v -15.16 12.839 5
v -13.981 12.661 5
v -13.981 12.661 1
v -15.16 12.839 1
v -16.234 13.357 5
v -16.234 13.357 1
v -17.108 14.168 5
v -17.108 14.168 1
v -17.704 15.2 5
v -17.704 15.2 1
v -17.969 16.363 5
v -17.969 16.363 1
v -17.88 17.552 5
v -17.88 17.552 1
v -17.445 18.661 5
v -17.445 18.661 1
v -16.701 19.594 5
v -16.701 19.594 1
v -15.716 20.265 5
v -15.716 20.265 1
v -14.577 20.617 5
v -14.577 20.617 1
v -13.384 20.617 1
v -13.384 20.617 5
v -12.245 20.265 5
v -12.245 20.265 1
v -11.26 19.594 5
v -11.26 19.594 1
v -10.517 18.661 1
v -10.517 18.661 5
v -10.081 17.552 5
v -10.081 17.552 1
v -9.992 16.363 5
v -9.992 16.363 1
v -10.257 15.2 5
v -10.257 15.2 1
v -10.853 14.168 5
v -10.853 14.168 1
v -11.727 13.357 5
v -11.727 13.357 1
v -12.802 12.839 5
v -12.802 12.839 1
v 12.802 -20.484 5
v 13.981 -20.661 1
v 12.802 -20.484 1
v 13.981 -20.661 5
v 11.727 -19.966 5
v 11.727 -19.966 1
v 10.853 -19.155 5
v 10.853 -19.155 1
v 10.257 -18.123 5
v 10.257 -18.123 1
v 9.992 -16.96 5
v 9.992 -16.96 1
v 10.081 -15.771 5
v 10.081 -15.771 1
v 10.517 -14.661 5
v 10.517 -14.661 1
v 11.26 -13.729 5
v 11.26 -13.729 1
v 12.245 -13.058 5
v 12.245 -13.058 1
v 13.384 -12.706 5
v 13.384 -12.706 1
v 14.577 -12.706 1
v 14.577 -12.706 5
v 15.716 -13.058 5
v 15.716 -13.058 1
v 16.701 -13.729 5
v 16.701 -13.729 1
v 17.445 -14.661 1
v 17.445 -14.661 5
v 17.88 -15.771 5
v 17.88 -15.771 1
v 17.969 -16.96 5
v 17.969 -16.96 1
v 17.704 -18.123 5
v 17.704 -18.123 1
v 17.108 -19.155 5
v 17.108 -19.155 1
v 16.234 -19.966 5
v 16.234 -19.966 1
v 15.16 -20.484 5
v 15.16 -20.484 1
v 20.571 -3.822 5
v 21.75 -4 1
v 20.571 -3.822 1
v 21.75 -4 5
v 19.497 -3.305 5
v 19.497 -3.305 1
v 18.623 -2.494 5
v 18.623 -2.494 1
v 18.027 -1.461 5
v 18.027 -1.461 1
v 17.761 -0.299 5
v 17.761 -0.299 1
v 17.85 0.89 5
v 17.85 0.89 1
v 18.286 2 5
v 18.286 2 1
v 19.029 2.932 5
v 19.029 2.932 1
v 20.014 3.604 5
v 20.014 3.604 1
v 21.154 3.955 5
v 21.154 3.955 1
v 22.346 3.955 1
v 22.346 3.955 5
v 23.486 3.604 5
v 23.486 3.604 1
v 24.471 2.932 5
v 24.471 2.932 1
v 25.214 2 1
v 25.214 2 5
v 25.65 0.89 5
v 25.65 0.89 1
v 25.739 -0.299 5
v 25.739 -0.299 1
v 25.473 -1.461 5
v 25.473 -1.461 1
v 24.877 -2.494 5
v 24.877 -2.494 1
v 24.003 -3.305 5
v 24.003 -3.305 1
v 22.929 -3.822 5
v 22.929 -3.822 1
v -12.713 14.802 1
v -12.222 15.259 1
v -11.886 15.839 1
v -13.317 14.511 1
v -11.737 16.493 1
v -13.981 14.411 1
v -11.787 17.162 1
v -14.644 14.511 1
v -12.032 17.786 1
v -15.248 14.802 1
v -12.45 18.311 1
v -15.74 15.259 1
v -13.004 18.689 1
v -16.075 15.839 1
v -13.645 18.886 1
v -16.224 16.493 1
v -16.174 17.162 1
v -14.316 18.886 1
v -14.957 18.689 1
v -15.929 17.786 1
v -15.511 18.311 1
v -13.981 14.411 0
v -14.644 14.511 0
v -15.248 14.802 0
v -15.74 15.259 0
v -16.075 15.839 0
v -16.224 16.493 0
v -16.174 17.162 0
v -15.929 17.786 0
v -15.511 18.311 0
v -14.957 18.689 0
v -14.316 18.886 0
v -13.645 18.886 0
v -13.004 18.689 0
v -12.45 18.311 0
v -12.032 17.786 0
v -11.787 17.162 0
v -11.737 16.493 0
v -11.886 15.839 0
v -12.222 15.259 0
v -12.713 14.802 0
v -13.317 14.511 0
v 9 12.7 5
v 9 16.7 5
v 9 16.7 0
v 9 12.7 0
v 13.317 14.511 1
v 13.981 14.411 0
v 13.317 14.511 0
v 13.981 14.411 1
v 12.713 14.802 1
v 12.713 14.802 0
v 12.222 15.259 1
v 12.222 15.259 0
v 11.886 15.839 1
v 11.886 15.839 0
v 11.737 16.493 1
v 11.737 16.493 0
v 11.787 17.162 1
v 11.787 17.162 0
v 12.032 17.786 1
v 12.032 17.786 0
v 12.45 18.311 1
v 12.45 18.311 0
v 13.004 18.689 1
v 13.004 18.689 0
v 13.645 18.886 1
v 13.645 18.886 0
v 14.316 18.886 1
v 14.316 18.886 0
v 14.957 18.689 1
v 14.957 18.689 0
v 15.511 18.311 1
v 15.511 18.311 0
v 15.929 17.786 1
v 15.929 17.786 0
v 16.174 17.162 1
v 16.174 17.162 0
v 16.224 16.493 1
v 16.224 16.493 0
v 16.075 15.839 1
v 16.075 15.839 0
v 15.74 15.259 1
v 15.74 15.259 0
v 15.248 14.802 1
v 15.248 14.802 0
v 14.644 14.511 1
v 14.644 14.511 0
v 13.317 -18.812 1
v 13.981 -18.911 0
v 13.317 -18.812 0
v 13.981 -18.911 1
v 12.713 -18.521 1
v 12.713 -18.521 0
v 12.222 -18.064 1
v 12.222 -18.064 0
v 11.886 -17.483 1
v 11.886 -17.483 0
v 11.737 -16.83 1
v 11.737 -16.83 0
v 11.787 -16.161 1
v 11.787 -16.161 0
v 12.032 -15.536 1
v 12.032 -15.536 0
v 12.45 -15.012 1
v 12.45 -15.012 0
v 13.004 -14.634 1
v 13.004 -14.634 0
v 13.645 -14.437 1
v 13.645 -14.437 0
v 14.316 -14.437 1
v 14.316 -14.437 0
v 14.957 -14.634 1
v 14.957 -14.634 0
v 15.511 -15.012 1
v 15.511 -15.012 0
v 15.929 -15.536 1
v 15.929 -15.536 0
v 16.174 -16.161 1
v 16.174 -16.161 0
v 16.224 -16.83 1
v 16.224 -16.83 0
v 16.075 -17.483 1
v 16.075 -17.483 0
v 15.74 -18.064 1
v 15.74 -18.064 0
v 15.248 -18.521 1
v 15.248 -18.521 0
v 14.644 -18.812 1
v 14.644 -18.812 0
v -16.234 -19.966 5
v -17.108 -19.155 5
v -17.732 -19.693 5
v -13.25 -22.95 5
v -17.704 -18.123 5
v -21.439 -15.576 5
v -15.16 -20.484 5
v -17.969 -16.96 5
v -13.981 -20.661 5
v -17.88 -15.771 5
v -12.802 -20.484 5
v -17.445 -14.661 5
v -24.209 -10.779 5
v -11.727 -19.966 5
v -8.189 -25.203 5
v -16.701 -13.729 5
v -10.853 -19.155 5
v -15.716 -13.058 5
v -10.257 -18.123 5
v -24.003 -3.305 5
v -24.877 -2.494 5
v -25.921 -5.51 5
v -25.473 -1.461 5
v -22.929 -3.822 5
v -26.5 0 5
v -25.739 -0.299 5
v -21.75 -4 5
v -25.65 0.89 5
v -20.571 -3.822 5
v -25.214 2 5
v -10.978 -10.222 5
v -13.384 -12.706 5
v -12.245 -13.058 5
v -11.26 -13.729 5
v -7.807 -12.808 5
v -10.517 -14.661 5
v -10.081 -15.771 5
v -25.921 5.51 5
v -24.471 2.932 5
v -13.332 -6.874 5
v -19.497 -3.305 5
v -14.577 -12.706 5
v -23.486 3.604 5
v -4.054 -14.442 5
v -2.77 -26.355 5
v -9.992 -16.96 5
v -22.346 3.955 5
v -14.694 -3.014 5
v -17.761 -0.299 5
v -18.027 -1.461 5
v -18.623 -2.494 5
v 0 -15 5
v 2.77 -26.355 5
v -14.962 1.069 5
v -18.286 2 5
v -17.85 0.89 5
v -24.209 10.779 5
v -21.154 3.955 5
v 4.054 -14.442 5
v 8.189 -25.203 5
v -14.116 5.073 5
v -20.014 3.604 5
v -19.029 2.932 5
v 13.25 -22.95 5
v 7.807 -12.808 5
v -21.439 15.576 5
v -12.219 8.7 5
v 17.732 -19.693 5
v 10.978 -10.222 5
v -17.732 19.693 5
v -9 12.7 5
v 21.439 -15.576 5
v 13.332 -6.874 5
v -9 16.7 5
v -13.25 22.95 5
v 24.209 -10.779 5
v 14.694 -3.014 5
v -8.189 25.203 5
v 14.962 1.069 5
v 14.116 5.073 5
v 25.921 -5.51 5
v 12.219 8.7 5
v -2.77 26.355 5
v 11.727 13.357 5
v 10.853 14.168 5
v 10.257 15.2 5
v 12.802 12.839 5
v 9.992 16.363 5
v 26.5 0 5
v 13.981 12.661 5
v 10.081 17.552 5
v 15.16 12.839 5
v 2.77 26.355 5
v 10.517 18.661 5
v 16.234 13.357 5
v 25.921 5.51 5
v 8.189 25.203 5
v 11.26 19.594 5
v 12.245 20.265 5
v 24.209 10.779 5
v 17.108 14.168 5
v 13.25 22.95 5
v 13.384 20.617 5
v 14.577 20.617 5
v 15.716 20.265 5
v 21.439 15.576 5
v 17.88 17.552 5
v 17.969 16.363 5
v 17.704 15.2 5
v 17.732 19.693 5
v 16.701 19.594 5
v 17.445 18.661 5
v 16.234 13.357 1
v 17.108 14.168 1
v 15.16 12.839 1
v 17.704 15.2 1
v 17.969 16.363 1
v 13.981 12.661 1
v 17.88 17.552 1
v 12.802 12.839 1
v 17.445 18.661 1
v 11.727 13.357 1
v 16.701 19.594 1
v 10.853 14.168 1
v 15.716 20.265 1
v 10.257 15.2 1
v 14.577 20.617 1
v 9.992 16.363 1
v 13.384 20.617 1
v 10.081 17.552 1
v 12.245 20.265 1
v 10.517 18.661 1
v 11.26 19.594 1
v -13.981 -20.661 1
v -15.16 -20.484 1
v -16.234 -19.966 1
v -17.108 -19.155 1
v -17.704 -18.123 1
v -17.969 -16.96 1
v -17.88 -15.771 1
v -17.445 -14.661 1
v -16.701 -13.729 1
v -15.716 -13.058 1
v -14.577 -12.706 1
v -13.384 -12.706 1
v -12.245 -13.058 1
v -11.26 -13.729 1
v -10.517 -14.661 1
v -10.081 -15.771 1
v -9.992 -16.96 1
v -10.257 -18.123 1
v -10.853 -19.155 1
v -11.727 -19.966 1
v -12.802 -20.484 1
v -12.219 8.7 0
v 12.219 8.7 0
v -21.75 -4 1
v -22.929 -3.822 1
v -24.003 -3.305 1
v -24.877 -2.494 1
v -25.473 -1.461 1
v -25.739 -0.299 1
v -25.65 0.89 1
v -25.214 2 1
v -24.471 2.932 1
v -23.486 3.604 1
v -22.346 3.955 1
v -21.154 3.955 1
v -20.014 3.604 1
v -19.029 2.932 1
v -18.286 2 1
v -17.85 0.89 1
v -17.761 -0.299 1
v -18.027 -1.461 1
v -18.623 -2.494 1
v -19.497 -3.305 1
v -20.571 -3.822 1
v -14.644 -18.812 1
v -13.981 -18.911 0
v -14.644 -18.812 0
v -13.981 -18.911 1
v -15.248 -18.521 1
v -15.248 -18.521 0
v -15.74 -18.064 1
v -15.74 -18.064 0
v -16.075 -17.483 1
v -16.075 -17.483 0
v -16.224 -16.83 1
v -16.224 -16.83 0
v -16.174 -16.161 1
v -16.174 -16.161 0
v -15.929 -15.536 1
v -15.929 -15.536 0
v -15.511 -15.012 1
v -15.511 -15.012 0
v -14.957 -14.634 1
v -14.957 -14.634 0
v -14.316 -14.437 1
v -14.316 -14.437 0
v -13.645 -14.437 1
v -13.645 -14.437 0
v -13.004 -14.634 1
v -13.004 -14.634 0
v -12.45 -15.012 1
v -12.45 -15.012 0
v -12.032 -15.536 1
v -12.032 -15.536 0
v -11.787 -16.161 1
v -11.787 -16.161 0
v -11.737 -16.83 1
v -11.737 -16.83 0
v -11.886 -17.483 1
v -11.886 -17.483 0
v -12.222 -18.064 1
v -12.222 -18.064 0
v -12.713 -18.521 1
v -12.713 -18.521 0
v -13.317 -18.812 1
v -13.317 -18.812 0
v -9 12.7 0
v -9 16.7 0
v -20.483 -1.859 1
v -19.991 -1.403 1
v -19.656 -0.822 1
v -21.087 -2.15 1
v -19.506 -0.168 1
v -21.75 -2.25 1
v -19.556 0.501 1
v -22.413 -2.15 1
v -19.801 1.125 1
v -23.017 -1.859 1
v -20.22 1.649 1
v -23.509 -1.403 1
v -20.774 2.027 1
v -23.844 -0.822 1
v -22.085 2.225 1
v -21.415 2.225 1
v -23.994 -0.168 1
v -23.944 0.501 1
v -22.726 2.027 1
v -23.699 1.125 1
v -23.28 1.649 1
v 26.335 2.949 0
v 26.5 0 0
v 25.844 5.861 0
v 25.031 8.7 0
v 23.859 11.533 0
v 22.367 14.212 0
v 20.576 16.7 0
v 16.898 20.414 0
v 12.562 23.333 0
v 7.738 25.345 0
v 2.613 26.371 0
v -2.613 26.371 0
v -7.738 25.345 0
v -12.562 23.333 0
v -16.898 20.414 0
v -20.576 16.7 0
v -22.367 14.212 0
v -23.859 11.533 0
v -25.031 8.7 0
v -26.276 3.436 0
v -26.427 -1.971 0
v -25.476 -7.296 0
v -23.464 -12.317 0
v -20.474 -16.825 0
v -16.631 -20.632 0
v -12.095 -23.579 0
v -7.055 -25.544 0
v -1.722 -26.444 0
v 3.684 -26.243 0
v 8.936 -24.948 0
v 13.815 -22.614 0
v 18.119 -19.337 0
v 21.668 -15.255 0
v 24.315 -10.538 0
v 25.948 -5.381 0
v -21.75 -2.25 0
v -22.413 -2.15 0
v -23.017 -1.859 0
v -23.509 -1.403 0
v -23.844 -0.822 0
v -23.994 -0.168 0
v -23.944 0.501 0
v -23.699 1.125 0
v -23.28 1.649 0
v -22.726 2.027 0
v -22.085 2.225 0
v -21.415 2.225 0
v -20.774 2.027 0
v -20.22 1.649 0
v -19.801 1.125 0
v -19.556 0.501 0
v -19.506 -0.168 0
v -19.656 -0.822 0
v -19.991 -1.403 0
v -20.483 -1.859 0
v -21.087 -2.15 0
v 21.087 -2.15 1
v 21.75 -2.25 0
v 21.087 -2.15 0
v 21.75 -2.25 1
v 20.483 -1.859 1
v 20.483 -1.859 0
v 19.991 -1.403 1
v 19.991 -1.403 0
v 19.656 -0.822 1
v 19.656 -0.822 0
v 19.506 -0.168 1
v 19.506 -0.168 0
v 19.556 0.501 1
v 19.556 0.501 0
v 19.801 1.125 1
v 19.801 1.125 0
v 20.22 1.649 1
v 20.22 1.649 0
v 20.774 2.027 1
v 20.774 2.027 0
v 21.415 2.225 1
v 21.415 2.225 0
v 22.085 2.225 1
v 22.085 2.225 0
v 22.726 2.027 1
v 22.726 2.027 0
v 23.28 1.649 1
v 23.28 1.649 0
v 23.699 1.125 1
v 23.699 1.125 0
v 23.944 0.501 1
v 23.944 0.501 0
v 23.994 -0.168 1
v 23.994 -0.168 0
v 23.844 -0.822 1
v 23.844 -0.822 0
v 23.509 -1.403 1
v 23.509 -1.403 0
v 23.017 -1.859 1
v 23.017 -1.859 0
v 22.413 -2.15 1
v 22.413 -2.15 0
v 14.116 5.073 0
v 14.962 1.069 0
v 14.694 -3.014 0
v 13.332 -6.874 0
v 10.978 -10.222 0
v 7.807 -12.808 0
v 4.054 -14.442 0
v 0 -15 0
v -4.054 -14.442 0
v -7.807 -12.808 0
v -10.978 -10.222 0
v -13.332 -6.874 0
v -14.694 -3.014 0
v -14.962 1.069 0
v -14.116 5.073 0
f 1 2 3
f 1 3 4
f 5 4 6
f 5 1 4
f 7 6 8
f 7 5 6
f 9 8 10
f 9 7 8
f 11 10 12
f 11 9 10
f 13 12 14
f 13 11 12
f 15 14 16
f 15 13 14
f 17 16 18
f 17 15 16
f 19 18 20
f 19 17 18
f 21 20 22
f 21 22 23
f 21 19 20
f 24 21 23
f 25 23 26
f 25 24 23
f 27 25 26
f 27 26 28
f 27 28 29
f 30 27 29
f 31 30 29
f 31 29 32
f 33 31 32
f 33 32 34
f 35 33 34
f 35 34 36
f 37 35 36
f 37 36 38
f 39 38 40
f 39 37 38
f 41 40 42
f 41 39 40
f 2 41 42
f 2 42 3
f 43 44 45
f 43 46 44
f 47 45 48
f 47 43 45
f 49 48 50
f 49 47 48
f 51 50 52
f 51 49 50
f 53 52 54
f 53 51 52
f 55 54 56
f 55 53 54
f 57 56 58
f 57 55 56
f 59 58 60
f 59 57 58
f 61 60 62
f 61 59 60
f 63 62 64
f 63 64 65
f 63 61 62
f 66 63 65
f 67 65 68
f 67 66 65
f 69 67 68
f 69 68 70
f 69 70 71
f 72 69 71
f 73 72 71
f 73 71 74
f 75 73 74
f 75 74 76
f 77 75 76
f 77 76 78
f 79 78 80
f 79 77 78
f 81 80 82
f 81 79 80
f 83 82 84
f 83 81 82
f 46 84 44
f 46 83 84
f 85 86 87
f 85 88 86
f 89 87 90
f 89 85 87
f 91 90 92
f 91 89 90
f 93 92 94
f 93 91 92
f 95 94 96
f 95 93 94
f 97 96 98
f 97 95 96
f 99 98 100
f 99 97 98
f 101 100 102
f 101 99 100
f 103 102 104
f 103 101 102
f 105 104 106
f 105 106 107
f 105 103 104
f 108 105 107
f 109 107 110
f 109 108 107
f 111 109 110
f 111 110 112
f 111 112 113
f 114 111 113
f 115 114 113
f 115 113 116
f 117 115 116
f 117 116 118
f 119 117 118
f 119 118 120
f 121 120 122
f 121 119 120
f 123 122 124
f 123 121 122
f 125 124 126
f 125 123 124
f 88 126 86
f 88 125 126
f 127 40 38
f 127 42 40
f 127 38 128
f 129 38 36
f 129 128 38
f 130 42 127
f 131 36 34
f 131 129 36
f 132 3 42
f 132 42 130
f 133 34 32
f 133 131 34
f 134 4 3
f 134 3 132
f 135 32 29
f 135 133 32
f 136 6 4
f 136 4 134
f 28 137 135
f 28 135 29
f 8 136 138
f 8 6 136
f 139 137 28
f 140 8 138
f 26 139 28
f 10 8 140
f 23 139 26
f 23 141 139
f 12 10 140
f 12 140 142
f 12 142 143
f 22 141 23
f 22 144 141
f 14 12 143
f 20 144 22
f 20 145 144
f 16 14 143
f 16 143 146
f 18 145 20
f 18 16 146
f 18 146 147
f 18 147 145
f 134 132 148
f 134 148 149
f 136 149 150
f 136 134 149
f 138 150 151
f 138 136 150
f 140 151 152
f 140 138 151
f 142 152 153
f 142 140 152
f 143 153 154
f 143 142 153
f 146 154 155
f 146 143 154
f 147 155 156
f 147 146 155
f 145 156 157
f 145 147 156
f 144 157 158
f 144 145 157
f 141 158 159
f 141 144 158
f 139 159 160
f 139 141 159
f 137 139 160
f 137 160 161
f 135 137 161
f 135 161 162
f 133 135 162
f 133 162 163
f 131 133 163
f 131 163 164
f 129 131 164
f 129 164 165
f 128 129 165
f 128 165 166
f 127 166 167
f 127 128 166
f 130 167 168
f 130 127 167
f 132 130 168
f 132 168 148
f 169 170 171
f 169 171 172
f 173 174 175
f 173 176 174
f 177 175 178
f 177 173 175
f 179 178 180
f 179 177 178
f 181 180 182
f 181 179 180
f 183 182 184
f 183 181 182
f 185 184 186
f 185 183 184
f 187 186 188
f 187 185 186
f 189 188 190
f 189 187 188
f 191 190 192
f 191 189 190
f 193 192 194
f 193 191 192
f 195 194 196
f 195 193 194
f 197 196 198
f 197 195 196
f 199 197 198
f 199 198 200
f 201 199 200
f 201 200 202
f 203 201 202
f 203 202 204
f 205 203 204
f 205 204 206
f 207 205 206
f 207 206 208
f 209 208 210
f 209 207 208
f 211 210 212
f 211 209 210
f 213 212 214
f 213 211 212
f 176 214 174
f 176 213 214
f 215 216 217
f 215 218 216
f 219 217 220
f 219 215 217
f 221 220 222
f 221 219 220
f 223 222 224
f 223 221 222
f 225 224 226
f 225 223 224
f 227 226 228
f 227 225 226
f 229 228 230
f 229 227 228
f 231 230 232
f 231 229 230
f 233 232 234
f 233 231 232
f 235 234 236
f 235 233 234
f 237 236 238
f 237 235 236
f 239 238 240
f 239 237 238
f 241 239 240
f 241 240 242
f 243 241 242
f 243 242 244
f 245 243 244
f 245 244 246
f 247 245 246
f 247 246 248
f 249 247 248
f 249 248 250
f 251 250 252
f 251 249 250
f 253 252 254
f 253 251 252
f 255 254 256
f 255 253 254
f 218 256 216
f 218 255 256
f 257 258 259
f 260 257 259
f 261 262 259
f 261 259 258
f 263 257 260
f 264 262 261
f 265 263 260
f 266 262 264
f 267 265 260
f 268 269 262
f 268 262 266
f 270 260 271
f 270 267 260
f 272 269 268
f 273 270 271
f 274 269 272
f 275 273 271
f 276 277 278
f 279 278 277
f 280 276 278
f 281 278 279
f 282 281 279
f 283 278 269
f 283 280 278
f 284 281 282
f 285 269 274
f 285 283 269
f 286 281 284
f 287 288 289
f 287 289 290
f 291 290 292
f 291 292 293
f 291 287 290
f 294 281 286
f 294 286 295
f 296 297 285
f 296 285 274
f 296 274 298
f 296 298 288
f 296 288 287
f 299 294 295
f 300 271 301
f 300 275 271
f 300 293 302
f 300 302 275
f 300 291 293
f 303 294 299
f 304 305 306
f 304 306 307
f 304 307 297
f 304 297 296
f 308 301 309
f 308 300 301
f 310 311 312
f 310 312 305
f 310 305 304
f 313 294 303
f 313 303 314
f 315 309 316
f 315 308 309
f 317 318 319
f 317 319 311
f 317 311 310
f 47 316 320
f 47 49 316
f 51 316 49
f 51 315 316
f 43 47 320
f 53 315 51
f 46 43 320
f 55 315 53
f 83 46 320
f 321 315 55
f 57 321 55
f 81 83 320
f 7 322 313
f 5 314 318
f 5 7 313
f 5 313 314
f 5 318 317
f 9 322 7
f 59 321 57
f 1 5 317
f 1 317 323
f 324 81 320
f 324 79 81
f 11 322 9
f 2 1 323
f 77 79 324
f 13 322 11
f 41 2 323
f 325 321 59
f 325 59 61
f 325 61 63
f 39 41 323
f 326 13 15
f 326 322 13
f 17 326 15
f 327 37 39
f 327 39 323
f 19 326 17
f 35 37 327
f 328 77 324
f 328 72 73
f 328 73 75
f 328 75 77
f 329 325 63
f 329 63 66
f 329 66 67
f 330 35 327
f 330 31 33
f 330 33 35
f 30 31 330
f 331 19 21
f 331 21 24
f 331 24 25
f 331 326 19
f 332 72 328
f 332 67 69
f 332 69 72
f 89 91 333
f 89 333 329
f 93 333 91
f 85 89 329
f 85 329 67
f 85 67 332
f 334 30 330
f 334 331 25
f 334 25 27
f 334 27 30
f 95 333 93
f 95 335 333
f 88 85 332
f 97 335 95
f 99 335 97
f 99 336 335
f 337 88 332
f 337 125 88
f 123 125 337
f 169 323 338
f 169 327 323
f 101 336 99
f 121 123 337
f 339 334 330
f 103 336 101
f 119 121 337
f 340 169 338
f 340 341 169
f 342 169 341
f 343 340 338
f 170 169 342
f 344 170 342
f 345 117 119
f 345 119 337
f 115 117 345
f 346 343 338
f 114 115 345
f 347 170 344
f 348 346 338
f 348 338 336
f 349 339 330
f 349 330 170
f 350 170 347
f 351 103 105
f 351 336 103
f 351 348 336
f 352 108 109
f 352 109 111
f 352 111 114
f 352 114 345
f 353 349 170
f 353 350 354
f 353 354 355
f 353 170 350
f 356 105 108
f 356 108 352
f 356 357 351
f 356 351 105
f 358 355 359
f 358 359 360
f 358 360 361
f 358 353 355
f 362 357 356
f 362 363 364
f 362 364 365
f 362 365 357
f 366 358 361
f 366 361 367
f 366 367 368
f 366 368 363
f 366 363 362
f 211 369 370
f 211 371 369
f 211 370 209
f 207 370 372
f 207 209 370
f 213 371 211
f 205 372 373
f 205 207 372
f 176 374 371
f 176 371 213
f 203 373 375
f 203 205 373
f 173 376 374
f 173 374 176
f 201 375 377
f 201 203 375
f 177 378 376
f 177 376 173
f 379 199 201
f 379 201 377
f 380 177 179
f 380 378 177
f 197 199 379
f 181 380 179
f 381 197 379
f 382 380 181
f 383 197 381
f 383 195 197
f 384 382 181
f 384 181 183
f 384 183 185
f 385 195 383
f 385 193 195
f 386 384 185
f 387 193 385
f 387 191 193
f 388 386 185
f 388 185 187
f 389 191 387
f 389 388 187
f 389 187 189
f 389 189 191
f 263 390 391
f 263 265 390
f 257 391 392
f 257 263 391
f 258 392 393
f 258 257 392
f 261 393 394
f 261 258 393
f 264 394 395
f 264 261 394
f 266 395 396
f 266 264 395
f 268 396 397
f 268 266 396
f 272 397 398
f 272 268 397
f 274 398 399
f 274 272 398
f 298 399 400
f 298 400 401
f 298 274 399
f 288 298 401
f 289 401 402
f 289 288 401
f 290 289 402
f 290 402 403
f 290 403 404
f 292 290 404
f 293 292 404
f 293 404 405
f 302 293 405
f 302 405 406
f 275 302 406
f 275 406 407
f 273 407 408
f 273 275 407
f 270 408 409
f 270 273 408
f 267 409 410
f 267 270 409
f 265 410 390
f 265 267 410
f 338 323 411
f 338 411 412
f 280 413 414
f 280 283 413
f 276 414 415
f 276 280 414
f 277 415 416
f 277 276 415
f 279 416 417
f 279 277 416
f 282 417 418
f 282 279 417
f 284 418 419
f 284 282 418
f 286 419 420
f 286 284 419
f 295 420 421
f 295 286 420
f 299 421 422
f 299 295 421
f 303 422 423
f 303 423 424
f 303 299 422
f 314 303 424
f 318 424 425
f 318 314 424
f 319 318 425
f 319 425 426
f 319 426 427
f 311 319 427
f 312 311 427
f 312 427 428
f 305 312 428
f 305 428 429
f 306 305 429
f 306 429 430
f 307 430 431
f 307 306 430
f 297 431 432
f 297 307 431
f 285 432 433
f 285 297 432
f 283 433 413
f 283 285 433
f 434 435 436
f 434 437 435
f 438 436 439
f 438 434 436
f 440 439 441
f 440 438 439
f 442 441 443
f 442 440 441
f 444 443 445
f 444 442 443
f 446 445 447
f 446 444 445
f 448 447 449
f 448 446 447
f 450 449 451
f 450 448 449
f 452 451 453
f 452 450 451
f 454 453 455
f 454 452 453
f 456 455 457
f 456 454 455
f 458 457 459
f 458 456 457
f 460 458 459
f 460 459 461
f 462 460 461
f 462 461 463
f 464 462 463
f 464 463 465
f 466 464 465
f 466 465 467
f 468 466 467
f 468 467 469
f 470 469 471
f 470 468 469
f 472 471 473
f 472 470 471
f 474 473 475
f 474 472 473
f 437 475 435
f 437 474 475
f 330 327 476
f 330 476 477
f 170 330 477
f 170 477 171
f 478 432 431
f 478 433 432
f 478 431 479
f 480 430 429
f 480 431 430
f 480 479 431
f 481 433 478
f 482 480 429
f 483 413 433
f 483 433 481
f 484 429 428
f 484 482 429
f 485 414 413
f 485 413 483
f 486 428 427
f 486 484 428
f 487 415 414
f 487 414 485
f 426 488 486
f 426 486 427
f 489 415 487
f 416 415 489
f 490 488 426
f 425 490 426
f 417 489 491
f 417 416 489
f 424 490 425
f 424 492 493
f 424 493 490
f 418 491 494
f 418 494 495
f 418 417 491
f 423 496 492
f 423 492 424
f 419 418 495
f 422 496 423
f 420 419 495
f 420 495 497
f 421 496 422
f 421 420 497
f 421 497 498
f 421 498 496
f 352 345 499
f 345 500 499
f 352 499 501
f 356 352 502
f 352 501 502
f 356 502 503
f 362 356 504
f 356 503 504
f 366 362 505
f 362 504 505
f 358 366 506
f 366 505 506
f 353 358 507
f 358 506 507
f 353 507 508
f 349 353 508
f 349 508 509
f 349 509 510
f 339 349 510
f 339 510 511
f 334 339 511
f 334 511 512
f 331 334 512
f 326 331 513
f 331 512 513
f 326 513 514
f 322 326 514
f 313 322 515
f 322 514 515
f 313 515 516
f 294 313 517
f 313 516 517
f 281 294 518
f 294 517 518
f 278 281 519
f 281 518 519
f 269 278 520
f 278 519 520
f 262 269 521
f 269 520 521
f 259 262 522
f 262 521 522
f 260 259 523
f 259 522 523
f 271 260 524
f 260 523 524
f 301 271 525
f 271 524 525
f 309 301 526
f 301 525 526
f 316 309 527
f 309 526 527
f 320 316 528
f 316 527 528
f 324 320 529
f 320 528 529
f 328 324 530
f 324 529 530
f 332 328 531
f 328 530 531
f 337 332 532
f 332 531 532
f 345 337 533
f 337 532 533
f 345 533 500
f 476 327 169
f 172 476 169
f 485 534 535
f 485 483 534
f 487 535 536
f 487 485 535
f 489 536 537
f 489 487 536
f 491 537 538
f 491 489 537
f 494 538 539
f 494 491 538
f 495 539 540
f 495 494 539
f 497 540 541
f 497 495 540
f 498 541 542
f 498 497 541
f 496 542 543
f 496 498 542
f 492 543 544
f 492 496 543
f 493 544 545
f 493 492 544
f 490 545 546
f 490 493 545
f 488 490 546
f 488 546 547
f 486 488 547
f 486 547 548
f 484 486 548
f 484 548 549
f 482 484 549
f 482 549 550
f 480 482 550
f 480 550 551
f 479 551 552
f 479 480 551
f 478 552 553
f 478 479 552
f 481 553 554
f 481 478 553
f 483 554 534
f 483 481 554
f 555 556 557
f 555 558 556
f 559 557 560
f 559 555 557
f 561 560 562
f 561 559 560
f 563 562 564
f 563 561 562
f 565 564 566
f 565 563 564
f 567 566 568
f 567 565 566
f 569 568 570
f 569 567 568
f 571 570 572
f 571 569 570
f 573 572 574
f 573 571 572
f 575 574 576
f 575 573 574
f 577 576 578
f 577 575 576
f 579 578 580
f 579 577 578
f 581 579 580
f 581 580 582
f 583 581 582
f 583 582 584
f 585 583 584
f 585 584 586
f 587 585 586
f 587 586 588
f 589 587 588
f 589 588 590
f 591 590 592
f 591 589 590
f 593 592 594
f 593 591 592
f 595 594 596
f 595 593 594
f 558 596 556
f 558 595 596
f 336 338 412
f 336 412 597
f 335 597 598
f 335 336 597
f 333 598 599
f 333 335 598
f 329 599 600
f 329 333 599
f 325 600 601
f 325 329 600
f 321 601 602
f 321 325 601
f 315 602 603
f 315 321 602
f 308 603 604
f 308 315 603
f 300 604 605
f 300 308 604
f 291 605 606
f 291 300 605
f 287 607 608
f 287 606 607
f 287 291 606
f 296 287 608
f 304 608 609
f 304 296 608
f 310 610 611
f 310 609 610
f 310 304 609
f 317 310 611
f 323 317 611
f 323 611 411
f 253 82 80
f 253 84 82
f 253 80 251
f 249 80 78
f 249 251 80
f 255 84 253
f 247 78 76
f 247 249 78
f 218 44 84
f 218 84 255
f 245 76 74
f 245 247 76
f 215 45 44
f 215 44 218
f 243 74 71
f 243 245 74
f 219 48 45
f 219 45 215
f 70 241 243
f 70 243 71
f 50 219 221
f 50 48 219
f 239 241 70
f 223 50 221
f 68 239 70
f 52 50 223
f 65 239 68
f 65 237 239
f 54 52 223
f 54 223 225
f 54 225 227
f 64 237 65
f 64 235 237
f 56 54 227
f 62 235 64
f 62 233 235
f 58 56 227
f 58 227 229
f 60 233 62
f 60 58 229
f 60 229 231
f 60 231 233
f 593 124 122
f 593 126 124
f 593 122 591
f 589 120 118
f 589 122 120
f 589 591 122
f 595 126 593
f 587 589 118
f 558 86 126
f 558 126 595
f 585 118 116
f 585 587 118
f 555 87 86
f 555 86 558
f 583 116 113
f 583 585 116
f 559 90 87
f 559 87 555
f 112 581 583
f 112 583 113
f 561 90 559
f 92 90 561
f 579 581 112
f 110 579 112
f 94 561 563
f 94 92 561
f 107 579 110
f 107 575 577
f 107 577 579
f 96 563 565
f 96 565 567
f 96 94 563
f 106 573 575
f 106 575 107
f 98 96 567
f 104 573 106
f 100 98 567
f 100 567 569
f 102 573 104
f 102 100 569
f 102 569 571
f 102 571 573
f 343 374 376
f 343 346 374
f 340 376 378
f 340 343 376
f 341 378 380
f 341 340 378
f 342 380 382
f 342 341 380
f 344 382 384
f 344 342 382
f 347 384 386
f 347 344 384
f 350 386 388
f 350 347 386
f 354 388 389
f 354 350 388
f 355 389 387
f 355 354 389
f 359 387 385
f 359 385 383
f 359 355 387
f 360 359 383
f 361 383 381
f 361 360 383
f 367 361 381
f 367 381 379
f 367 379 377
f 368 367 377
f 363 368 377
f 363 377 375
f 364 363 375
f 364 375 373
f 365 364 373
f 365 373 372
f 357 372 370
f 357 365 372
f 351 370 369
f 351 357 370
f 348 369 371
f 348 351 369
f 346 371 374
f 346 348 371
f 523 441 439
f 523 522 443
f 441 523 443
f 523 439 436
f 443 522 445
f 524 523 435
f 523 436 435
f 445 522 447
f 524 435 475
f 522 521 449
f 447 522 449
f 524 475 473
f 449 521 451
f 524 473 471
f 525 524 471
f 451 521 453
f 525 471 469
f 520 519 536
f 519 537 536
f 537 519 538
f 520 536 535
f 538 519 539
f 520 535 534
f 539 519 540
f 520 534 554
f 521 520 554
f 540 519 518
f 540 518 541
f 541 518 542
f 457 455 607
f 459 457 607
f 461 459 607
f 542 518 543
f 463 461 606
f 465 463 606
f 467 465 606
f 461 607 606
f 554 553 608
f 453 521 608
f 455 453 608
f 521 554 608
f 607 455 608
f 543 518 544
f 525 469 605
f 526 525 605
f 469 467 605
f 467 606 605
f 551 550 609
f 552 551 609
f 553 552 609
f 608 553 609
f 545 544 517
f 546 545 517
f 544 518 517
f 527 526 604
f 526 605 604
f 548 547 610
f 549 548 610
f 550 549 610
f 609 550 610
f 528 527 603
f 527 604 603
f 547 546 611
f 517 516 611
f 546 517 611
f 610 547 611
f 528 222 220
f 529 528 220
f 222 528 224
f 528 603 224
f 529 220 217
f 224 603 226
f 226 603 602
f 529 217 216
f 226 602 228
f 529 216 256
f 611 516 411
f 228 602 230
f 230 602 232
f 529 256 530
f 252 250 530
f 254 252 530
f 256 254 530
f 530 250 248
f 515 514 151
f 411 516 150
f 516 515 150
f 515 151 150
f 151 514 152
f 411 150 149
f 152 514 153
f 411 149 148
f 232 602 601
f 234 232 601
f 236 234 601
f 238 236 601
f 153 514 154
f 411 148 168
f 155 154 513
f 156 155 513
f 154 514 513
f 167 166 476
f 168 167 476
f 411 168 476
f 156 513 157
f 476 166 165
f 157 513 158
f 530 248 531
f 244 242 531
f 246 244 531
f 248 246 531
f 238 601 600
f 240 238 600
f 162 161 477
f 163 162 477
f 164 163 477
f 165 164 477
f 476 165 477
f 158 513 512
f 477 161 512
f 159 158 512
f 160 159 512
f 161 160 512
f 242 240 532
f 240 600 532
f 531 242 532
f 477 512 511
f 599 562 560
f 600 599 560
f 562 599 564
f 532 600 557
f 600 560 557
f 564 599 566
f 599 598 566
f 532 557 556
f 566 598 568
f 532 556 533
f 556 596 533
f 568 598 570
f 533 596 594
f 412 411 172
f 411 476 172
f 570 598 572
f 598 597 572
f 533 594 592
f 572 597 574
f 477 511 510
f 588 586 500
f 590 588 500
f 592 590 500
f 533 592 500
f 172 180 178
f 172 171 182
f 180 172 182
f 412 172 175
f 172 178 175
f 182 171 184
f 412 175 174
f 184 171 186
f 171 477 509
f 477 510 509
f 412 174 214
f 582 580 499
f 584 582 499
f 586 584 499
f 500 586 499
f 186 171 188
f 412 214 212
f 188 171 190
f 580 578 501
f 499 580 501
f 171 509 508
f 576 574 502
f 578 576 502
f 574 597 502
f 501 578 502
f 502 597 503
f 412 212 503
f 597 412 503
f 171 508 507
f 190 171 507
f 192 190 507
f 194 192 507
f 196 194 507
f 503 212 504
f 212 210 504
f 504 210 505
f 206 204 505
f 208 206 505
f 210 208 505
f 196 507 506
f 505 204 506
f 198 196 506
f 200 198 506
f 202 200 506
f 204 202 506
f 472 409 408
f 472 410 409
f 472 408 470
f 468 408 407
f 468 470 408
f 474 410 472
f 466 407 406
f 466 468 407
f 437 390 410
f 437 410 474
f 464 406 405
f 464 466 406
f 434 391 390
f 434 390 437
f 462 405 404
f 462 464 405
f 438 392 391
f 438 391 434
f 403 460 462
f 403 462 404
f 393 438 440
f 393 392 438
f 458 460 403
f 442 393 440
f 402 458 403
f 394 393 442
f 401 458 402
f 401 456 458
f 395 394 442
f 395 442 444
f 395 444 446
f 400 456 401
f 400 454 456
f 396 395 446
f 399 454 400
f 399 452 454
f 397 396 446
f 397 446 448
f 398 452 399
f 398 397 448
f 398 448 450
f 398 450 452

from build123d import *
from build123d.topology import SkipClean

# Parameters (mm, degrees)
SKETCH_1_R                   = 26.5
EXTRUDE_1_DEPTH              = 5
HOLE_WIZARD_M4_1_AT_2_COUNT  = 2
HOLE_WIZARD_M4_1_AT_2_PITCH  = 39.424388736
HOLE_WIZARD_M4_1_AT_3_COUNT  = 2
HOLE_WIZARD_M4_1_AT_3_PITCH  = 39.424388736
HOLE_WIZARD_M4_1_AT_4_COUNT  = 2
HOLE_WIZARD_M4_1_AT_4_PITCH  = 18.383894388
HOLE_WIZARD_M4_1_AT_5_COUNT  = 2
HOLE_WIZARD_M4_1_AT_5_PITCH  = 43.5
HOLE_WIZARD_M4_1_AT_6_COUNT  = 2
HOLE_WIZARD_M4_1_AT_6_PITCH  = 39.424388736
HOLE_WIZARD_M4_1_AT_7_COUNT  = 2
HOLE_WIZARD_M4_1_AT_7_PITCH  = 18.383894388
EXTRUDE_1551_DEPTH           = 8
CUT_EXTRUDE_START            = 22
SKETCH_6_R                   = 4
CUT_EXTRUDE_1661_DEPTH       = 22
SKETCH_8_R                   = 34.5
CUT_EXTRUDE_1747_DEPTH       = 119.962346984
HOLE_WIZARD_M3_1_D           = 3.4
HOLE_WIZARD_M3_1_CBORE_D     = 6.5
HOLE_WIZARD_M3_1_CBORE_DEPTH = 3
CUT_EXTRUDE_1_DEPTH          = 15
CUT_EXTRUDE_2_DEPTH          = 5
CUT_EXTRUDE_3_DEPTH          = 10
SKETCH_15_W                  = 96
SKETCH_15_H                  = 8
CUT_EXTRUDE_4_DEPTH          = 113.29536945
CUT_EXTRUDE_5_DEPTH          = 10


with BuildPart() as part:
    # 草图1 → 凸台-拉伸1 (new body)
    with BuildSketch(Plane.XY):
        Circle(SKETCH_1_R)
    extrude(amount=EXTRUDE_1_DEPTH)

    # 草图3 → M4 六角凹头盖的柱孔1 (revolve, cut)
    with BuildSketch(Plane(origin=(21.75, 0, 5), x_dir=(0, -1, 0), z_dir=(1, 0, 0))):
        Polygon((0, 0), (0, 5), (2.25, 5), (2.25, 4), (4, 4), (4, 0), align=None)
    hole_wizard_m4_1 = revolve(axis=Axis((21.75, 0, 11.35), (0, 0, -1)), mode=Mode.SUBTRACT)

    # M4 六角凹头盖的柱孔1 at 2: M4 六角凹头盖的柱孔1 ×2
    with Locations(*[Vector(-0.9063077870366496, 0.4226182617407002, 0) * (i * HOLE_WIZARD_M4_1_AT_2_PITCH) for i in range(1, HOLE_WIZARD_M4_1_AT_2_COUNT)]):
        add(hole_wizard_m4_1, mode=Mode.SUBTRACT)

    # M4 六角凹头盖的柱孔1 at 3: M4 六角凹头盖的柱孔1 ×2
    with Locations(*[Vector(-0.9063077870125524, 0.42261826179237694, 0) * (i * HOLE_WIZARD_M4_1_AT_3_PITCH) for i in range(1, HOLE_WIZARD_M4_1_AT_3_COUNT)]):
        add(hole_wizard_m4_1, mode=Mode.SUBTRACT)

    # M4 六角凹头盖的柱孔1 at 4: M4 六角凹头盖的柱孔1 ×2
    with Locations(*[Vector(-0.42261826172613215, 0.9063077870434428, 0) * (i * HOLE_WIZARD_M4_1_AT_4_PITCH) for i in range(1, HOLE_WIZARD_M4_1_AT_4_COUNT)]):
        add(hole_wizard_m4_1, mode=Mode.SUBTRACT)

    # M4 六角凹头盖的柱孔1 at 5: M4 六角凹头盖的柱孔1 ×2
    with Locations(*[(-i * HOLE_WIZARD_M4_1_AT_5_PITCH, 0, 0) for i in range(1, HOLE_WIZARD_M4_1_AT_5_COUNT)]):
        add(hole_wizard_m4_1, mode=Mode.SUBTRACT)

    # M4 六角凹头盖的柱孔1 at 6: M4 六角凹头盖的柱孔1 ×2
    with Locations(*[Vector(-0.9063077870125524, -0.42261826179237694, 0) * (i * HOLE_WIZARD_M4_1_AT_6_PITCH) for i in range(1, HOLE_WIZARD_M4_1_AT_6_COUNT)]):
        add(hole_wizard_m4_1, mode=Mode.SUBTRACT)

    # M4 六角凹头盖的柱孔1 at 7: M4 六角凹头盖的柱孔1 ×2
    with Locations(*[Vector(-0.42261826172613215, -0.9063077870434428, 0) * (i * HOLE_WIZARD_M4_1_AT_7_PITCH) for i in range(1, HOLE_WIZARD_M4_1_AT_7_COUNT)]):
        add(hole_wizard_m4_1, mode=Mode.SUBTRACT)

    # 草图5 → Extrude 1551 (add)
    with BuildSketch(Plane.XZ.offset(-8.7)):
        with BuildLine():
            Line((-26.5, 5), (-26.5, 14.978130978))
            ThreePointArc((-26.5, 14.978130978), (0, 103), (26.5, 14.978130978))
            Line((26.5, 14.978130978), (26.5, 5))
            Line((26.5, 5), (-26.5, 5))
        make_face()
    extrude(amount=-EXTRUDE_1551_DEPTH)

    # 草图6 → Cut-Extrude 1661 (cut)
    with SkipClean():  # the faces are left unmerged after this step: merging them gives an invalid solid
        with BuildSketch(Plane.XY.offset(5).offset(CUT_EXTRUDE_START)):
            with Locations((-13.98063051, 16.66146664)):
                Circle(SKETCH_6_R)
            with Locations((13.98063051, 16.66146664)):
                Circle(SKETCH_6_R)
        extrude(amount=-CUT_EXTRUDE_1661_DEPTH, mode=Mode.SUBTRACT)
    add(part.part.scale(1), mode=Mode.REPLACE)  # the faces are merged on a copy

    # 草图8 → Cut-Extrude 1747 (cut, through all)
    with BuildSketch(Plane.XZ.offset(-8.7)):
        with Locations((0, 55)):
            Circle(SKETCH_8_R)
    extrude(amount=-CUT_EXTRUDE_1747_DEPTH, mode=Mode.SUBTRACT)

    # M3 六角凹头盖的柱孔1 (through all)
    with Locations(Plane(origin=(-9.576304669, 16.7, 19.260744427), x_dir=(0, 0, 1), z_dir=(0, 1, 0))):
        with Locations((0, 0), (0, 19.152609338), (9.576304669, 35.739255573), (26.162950904, 45.315560242), (45.315560242, 45.315560242), (62.358629164, 36.19567826), (71.478511143, 19.152609339), (71.478511146, 0), (61.902206477, -16.586646235), (9.576304669, -16.586646235), (26.162950904, -26.162950904), (45.315560242, -26.162950904)):
            CounterBoreHole(HOLE_WIZARD_M3_1_D / 2, HOLE_WIZARD_M3_1_CBORE_D / 2, HOLE_WIZARD_M3_1_CBORE_DEPTH)

    # 草图11 → 切除-拉伸1 (cut)
    with BuildSketch(Plane.XY):
        with BuildLine():
            Line((-25.031180555, 8.7), (-29.031180555, 8.7))
            Line((-29.031180555, 8.7), (-29.031180555, 16.7))
            Line((-29.031180555, 16.7), (-20.575713839, 16.7))
            ThreePointArc((-20.575713839, 16.7), (-23.151613423, 12.893905379), (-25.031180555, 8.7))
        make_face()
        with BuildLine():
            Line((29.031180555, 16.7), (20.575713839, 16.7))
            ThreePointArc((20.575713839, 16.7), (23.151613423, 12.893905379), (25.031180555, 8.7))
            Line((25.031180555, 8.7), (29.031180555, 8.7))
            Line((29.031180555, 8.7), (29.031180555, 16.7))
        make_face()
    extrude(amount=CUT_EXTRUDE_1_DEPTH, mode=Mode.SUBTRACT)

    # 草图12 → 切除-拉伸2 (cut)
    with BuildSketch(Plane.XZ.offset(-8.7)):
        with BuildLine():
            Line((30.640436297, 73.992699353), (39.299497484, 79.033088453))
            ThreePointArc((39.299497484, 79.033088453), (22.961941343, 94.93481054), (1, 101.054748323))
            Line((1, 101.054748323), (1, 90.986108088))
            ThreePointArc((1, 90.986108088), (3.29678588, 90.848726312), (5.580104544, 90.56490417))
            ThreePointArc((5.580104544, 90.56490417), (10.611585442, 94.602959438), (12.949935188, 88.59015553))
            ThreePointArc((12.949935188, 88.59015553), (18.110429302, 86.112886725), (22.813026139, 82.848971404))
            ThreePointArc((22.813026139, 82.848971404), (29.429042421, 84.466469087), (27.899229179, 77.829629354))
            ThreePointArc((27.899229179, 77.829629354), (29.332637394, 75.956033707), (30.640436297, 73.992699353))
        make_face()
        with BuildLine():
            Line((31.628764833, 37.893824648), (40.299497484, 32.887774818))
            ThreePointArc((40.299497484, 32.887774818), (45.9673073, 55.081606369), (40.220731453, 77.255173811))
            Line((40.220731453, 77.255173811), (31.60381627, 72.239317654))
            ThreePointArc((31.60381627, 72.239317654), (32.667369713, 70.12740004), (33.58998558, 67.95021794))
            ThreePointArc((33.58998558, 67.95021794), (39.603491283, 65.610874453), (35.563251124, 60.5798469))
            ThreePointArc((35.563251124, 60.5798469), (35.998326415, 55.004146142), (35.564535509, 49.428345312))
            ThreePointArc((35.564535509, 49.428345312), (39.60579141, 44.366506044), (33.551263667, 42.065058704))
            ThreePointArc((33.551263667, 42.065058704), (32.656681203, 39.948715244), (31.628764833, 37.893824648))
        make_face()
        with BuildLine():
            Line((19.898823765, 25.001394455), (25.409425198, 16.693850218))
            ThreePointArc((25.409425198, 16.693850218), (33.152641178, 23.15816615), (39.299497484, 31.15572401))
            Line((39.299497484, 31.15572401), (30.628764833, 36.161773841))
            ThreePointArc((30.628764833, 36.161773841), (29.36313556, 34.244126853), (27.977619592, 32.411223983))
            ThreePointArc((27.977619592, 32.411223983), (29.011771602, 26.01712548), (22.607462255, 26.98603612))
            ThreePointArc((22.607462255, 26.98603612), (21.276296399, 25.962115548), (19.898823765, 25.001394455))
        make_face()
        with BuildLine():
            Line((-1, 90.986108088), (-1, 101.054748323))
            ThreePointArc((-1, 101.054748323), (-22.961941343, 94.93481054), (-39.299497484, 79.033088453))
            Line((-39.299497484, 79.033088453), (-30.640436297, 73.992699353))
            ThreePointArc((-30.640436297, 73.992699353), (-29.332637394, 75.956033707), (-27.899229179, 77.829629354))
            ThreePointArc((-27.899229179, 77.829629354), (-29.429042421, 84.466469087), (-22.813026139, 82.848971404))
            ThreePointArc((-22.813026139, 82.848971404), (-18.110429302, 86.112886725), (-12.949935188, 88.59015553))
            ThreePointArc((-12.949935188, 88.59015553), (-10.611585442, 94.602959438), (-5.580104544, 90.56490417))
            ThreePointArc((-5.580104544, 90.56490417), (-3.29678588, 90.848726312), (-1, 90.986108088))
        make_face()
        with BuildLine():
            ThreePointArc((-33.58998558, 67.95021794), (-32.667369713, 70.12740004), (-31.60381627, 72.239317654))
            Line((-31.60381627, 72.239317654), (-40.220731453, 77.255173811))
            ThreePointArc((-40.220731453, 77.255173811), (-45.9673073, 55.081606369), (-40.299497484, 32.887774818))
            Line((-40.299497484, 32.887774818), (-31.628764833, 37.893824648))
            ThreePointArc((-31.628764833, 37.893824648), (-32.656681203, 39.948715244), (-33.551263667, 42.065058704))
            ThreePointArc((-33.551263667, 42.065058704), (-39.60579141, 44.366506044), (-35.564535509, 49.428345312))
            ThreePointArc((-35.564535509, 49.428345312), (-35.998326415, 55.004146142), (-35.563251124, 60.5798469))
            ThreePointArc((-35.563251124, 60.5798469), (-39.603491283, 65.610874453), (-33.58998558, 67.95021794))
        make_face()
        with BuildLine():
            Line((-30.628764833, 36.161773841), (-39.299497484, 31.15572401))
            ThreePointArc((-39.299497484, 31.15572401), (-33.152641178, 23.15816615), (-25.409425198, 16.693850218))
            Line((-25.409425198, 16.693850218), (-19.898823765, 25.001394455))
            ThreePointArc((-19.898823765, 25.001394455), (-21.276296399, 25.962115548), (-22.607462255, 26.98603612))
            ThreePointArc((-22.607462255, 26.98603612), (-29.011771602, 26.01712548), (-27.977619592, 32.411223983))
            ThreePointArc((-27.977619592, 32.411223983), (-29.36313556, 34.244126853), (-30.628764833, 36.161773841))
        make_face()
    extrude(amount=-CUT_EXTRUDE_2_DEPTH, mode=Mode.SUBTRACT)

    # 草图13 → 切除-拉伸3 (cut)
    with BuildSketch(Plane.XY.offset(5)):
        with BuildLine():
            Line((-12.219247113, 8.7), (12.219247113, 8.7))
            ThreePointArc((12.219247113, 8.7), (0, -15), (-12.219247113, 8.7))
        make_face()
    extrude(amount=-CUT_EXTRUDE_3_DEPTH, mode=Mode.SUBTRACT)

    # 草图15 → 切除-拉伸4 (cut, through all)
    with BuildSketch(Plane.XY.offset(5)):
        with Locations((0, 12.7)):
            Rectangle(SKETCH_15_W, SKETCH_15_H)
    extrude(amount=CUT_EXTRUDE_4_DEPTH, mode=Mode.SUBTRACT)

    # 草图17 → 切除-拉伸5 (cut)
    with BuildSketch(Plane.XY.offset(5)):
        Polygon((0, 12.7), (-9, 12.7), (-9, 16.7), (9, 16.7), (9, 12.7), align=None)
    extrude(amount=-CUT_EXTRUDE_5_DEPTH, mode=Mode.SUBTRACT)


solid = part.part
